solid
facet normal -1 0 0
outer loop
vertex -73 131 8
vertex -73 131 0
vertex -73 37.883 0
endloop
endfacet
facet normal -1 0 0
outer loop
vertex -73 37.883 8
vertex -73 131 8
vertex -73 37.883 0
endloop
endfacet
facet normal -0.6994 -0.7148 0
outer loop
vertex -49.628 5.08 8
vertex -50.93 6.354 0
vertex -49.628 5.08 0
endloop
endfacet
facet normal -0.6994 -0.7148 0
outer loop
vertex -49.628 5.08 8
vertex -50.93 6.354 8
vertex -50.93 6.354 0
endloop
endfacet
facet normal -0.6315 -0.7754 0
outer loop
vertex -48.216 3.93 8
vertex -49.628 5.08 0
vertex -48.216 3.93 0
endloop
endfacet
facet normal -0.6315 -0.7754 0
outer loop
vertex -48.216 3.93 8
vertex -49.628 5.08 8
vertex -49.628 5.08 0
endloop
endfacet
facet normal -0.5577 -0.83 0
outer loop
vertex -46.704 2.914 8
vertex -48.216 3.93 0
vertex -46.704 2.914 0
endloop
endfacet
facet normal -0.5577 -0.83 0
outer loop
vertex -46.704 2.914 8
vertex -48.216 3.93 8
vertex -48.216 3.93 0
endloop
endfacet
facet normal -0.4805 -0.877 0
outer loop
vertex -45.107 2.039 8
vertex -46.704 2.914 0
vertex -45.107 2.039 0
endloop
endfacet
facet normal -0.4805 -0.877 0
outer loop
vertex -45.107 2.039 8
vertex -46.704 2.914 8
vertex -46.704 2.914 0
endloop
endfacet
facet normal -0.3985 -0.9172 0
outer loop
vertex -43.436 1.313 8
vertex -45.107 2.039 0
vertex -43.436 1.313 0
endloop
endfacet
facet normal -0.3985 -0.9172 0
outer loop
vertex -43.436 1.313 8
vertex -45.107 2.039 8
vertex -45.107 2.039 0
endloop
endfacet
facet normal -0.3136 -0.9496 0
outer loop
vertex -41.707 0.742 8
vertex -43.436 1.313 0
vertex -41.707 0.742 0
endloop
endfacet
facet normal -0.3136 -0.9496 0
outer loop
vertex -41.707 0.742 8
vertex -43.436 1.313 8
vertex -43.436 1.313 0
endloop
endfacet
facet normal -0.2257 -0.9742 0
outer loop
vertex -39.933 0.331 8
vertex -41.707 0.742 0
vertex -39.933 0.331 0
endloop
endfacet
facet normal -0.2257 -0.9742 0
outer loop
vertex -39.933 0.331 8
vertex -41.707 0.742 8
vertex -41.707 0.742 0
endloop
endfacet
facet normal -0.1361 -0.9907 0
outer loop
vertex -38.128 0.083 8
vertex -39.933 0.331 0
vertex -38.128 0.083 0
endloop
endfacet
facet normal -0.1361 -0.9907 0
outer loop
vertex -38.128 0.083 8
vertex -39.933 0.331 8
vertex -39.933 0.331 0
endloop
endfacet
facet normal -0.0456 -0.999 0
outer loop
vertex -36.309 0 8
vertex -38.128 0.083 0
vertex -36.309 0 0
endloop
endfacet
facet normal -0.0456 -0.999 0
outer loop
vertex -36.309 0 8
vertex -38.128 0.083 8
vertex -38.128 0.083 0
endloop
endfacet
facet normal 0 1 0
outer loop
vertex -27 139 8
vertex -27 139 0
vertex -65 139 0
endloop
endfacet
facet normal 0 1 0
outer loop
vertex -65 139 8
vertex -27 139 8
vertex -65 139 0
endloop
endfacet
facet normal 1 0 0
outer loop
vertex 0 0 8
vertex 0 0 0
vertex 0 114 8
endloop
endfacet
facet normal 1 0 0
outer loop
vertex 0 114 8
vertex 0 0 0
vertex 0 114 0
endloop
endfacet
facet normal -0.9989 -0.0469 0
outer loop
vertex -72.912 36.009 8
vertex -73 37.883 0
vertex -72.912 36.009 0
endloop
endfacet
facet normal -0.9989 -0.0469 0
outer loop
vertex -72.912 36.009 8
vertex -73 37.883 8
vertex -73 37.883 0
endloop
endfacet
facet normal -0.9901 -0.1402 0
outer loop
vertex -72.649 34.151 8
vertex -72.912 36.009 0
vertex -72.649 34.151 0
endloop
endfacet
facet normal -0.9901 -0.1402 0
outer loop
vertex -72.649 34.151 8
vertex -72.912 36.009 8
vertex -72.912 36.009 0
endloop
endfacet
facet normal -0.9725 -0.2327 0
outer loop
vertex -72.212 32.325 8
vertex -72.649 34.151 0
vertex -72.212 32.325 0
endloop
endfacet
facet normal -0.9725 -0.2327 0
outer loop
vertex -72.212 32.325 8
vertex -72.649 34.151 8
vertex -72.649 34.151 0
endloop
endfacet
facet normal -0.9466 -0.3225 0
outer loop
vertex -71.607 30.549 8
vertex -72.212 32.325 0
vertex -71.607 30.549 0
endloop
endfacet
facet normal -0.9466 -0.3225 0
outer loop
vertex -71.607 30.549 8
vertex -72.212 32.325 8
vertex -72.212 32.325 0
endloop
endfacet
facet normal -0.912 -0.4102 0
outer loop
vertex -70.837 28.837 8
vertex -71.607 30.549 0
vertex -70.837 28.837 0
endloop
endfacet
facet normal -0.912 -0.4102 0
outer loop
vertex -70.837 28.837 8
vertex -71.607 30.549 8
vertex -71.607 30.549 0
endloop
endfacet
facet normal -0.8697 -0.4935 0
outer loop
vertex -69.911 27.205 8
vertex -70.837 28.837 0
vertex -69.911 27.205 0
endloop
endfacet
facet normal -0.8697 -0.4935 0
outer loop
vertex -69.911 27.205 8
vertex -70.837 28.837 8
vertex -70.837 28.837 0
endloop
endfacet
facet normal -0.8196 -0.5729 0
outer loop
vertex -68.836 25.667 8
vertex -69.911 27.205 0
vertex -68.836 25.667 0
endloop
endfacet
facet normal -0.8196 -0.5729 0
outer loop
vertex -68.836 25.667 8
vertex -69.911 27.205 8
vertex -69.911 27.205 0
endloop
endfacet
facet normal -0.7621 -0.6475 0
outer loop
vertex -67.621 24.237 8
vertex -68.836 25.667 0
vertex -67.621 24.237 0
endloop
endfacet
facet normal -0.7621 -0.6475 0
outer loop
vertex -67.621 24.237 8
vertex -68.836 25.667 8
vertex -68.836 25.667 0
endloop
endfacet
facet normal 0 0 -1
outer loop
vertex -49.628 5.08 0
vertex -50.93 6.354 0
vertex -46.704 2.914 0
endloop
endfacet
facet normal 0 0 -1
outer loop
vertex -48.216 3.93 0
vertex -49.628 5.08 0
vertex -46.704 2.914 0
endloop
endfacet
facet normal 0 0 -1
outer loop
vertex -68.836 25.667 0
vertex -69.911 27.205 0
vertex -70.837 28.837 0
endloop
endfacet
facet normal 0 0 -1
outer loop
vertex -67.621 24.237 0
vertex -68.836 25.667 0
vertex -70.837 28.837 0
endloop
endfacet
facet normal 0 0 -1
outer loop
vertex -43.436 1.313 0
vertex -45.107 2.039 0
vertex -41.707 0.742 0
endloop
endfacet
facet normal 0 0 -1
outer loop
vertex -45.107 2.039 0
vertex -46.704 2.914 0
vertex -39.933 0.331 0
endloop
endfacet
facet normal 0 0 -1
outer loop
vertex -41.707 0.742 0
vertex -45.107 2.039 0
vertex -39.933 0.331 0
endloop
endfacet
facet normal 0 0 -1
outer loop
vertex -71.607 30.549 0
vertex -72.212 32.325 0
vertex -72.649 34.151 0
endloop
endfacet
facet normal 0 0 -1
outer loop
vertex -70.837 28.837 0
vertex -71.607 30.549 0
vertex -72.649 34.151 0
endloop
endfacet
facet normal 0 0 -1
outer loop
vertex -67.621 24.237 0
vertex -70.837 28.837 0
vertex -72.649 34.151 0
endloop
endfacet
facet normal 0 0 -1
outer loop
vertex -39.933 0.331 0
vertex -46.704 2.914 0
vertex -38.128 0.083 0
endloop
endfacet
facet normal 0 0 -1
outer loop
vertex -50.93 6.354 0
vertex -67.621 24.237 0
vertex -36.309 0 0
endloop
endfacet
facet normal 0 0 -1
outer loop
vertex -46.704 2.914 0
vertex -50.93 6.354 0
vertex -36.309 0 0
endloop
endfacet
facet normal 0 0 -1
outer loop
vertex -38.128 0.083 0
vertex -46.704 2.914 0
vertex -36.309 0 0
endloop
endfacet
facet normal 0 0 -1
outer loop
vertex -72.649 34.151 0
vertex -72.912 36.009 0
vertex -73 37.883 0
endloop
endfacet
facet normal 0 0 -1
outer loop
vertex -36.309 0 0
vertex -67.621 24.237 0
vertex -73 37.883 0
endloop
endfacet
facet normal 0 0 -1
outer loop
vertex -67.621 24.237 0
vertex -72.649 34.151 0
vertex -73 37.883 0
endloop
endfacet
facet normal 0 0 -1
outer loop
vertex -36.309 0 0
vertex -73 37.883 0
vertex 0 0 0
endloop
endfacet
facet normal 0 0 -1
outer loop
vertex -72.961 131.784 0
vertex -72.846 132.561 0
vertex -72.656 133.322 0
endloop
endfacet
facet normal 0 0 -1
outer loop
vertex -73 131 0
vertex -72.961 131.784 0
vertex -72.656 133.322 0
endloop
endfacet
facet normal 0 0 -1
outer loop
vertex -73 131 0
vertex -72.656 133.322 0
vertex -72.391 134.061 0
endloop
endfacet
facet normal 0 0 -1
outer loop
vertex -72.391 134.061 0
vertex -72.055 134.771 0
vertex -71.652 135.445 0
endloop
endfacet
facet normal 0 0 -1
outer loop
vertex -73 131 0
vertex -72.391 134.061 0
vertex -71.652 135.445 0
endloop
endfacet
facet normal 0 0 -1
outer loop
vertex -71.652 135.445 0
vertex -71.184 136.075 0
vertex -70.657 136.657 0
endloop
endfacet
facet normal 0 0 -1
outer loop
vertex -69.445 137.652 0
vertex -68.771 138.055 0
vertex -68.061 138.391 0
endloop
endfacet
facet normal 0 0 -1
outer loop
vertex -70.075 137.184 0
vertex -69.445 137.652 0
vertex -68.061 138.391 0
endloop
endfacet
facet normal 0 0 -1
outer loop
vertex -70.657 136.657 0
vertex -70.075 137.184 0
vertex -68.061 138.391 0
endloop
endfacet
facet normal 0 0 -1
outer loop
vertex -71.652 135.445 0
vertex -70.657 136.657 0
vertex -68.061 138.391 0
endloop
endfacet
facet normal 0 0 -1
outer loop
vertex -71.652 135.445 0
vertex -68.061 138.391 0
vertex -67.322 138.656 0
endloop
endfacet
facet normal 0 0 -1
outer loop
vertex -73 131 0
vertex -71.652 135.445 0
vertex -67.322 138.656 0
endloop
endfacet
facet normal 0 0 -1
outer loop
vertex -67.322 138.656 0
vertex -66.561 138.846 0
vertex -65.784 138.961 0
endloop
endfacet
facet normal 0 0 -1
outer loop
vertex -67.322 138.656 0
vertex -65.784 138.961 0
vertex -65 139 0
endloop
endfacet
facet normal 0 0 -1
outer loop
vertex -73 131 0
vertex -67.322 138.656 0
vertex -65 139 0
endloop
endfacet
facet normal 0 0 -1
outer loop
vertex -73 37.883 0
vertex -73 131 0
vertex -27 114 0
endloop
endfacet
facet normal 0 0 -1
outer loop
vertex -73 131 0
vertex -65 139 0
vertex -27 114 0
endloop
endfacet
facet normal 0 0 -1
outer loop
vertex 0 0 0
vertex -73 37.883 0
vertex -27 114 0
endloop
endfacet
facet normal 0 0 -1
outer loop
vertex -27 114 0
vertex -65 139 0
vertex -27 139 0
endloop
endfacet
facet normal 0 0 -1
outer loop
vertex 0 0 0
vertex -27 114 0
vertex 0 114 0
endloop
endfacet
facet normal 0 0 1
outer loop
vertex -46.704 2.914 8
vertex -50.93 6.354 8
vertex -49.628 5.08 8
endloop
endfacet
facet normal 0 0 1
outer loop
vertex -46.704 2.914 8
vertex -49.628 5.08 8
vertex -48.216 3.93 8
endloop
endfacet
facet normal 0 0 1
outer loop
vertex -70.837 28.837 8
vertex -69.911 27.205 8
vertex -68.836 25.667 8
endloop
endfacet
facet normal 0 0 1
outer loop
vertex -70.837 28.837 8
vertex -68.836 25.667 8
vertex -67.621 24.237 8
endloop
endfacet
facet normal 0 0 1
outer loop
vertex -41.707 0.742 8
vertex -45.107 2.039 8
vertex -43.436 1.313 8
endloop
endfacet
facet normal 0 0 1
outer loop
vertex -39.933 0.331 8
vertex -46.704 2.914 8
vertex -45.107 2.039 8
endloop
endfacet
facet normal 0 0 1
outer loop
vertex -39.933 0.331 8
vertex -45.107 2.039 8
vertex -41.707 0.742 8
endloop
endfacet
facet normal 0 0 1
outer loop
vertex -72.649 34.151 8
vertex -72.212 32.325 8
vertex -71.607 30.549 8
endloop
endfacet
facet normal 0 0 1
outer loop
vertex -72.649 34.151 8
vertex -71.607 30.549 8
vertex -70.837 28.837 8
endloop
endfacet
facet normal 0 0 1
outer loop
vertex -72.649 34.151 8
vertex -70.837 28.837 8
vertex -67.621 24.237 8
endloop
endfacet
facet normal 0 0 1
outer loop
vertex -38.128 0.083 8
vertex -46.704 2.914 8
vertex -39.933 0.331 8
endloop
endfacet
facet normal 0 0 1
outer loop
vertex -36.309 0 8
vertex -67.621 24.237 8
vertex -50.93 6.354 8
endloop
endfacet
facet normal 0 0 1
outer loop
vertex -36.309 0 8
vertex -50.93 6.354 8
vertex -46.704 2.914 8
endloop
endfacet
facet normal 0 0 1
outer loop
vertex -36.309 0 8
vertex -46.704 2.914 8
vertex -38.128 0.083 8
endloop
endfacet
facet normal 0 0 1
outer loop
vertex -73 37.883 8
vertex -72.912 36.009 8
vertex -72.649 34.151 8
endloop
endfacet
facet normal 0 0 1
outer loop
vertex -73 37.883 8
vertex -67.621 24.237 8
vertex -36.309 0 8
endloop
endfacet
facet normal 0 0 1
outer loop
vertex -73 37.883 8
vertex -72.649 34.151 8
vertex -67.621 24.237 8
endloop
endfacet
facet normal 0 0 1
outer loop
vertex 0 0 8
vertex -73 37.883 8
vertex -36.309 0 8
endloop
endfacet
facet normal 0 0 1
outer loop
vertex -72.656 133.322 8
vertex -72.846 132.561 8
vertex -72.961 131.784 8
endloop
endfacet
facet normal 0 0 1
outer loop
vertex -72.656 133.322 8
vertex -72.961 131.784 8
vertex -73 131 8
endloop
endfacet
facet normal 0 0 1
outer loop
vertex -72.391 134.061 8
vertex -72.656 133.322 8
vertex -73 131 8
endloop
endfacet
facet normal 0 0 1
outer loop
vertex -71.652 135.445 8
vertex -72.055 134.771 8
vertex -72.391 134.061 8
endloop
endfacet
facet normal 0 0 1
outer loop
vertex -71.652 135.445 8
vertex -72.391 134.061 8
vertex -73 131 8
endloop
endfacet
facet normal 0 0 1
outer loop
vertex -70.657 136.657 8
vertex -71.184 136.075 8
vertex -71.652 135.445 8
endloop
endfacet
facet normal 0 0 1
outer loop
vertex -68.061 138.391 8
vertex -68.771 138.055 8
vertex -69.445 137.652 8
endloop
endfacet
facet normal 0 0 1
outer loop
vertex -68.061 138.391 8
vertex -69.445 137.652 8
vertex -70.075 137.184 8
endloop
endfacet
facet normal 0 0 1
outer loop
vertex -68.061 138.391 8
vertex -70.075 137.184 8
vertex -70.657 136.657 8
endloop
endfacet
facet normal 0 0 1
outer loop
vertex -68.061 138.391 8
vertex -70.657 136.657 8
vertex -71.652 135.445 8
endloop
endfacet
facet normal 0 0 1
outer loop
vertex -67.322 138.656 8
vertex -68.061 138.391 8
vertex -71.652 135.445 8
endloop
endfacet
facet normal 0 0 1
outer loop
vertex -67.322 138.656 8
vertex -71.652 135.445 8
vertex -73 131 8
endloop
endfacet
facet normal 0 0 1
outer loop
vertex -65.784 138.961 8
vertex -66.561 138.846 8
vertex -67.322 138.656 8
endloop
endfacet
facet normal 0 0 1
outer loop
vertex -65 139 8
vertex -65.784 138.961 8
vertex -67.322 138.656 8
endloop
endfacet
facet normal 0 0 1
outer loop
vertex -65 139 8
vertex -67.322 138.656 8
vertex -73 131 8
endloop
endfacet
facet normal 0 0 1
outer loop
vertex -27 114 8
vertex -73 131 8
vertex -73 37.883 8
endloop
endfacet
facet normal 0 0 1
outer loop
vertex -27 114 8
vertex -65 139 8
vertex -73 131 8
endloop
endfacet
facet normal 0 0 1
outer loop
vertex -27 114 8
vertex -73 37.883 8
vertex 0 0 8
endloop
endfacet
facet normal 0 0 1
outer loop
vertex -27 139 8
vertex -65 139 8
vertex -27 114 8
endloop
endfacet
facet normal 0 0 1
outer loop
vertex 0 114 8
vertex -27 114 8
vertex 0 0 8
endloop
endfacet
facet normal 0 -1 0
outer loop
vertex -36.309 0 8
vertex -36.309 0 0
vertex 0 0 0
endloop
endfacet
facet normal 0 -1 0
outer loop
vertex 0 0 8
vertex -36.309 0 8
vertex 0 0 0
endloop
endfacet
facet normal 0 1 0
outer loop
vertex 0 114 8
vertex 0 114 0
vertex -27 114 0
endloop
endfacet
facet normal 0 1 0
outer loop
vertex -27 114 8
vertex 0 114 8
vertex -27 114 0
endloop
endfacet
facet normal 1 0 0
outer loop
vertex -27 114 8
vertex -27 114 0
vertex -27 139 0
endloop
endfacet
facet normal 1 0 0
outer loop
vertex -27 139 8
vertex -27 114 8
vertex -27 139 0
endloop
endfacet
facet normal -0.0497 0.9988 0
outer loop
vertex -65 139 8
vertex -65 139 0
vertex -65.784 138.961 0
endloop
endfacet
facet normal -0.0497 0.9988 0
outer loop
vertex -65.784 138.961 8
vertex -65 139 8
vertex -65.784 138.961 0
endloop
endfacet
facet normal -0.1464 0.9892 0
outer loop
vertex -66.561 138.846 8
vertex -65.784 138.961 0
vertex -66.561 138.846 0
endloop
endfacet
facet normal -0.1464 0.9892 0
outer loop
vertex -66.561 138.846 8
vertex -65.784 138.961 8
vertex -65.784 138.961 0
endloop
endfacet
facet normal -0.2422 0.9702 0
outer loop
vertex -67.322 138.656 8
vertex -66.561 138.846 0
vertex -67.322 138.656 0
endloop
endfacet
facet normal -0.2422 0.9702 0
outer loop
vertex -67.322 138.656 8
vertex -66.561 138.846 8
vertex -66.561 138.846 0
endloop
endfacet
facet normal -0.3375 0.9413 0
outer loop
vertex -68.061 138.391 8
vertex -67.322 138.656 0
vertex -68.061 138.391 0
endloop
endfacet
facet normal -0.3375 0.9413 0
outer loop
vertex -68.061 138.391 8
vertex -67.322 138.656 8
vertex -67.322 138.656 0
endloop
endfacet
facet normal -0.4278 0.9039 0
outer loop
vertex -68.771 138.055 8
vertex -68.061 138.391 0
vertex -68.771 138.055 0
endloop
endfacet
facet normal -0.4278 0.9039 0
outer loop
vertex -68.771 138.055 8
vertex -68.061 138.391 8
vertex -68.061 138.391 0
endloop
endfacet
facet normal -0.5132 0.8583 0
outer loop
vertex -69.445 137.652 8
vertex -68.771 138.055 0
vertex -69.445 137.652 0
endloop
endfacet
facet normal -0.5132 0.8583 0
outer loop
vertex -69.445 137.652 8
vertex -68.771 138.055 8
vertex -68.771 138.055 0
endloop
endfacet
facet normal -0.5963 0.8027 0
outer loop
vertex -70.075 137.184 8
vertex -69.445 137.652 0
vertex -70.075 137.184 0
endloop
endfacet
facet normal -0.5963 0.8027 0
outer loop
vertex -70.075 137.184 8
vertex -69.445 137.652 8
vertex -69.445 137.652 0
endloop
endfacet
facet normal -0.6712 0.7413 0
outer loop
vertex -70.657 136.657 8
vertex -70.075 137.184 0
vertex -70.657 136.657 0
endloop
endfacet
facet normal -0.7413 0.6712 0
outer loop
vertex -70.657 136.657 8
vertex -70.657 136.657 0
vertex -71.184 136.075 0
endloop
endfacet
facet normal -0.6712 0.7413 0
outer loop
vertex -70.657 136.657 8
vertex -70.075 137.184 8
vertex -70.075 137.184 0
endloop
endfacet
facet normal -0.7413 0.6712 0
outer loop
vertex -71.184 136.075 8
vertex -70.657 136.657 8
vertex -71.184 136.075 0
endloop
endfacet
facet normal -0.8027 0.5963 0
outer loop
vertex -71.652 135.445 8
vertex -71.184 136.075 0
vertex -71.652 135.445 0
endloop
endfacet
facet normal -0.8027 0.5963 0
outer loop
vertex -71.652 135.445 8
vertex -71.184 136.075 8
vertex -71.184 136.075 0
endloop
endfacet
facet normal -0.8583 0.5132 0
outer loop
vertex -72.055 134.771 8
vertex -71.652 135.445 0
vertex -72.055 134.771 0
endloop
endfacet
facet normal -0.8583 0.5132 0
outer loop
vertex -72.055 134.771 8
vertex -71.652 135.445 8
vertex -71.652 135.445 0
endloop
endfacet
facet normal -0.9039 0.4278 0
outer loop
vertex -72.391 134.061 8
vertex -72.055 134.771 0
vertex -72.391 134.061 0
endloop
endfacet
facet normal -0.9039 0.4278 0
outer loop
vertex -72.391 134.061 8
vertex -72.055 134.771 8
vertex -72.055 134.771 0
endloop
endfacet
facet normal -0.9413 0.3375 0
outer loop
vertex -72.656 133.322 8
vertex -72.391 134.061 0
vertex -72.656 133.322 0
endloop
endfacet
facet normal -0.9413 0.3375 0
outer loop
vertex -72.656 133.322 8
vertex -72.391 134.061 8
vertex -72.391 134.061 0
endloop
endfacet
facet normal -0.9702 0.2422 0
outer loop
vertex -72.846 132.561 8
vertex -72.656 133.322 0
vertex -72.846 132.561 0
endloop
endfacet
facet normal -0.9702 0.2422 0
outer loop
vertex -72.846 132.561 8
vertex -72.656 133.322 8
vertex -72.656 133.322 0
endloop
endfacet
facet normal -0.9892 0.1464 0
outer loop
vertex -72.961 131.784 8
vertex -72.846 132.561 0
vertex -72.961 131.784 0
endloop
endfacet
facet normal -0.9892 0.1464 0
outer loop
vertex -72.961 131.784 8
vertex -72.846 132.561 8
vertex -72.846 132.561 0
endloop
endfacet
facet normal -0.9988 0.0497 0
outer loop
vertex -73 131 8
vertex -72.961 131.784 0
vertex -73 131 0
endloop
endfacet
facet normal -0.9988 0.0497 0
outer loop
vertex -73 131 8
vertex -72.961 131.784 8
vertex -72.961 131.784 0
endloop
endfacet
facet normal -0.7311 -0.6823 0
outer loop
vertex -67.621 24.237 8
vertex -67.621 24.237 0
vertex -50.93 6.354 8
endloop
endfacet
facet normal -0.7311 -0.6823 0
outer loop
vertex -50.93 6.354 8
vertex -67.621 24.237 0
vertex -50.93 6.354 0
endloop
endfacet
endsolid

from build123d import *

# Parameters (mm, degrees)
EXTRUDE_1_DEPTH = 8
FILLET_1_R      = 8
FILLET_2_R      = 20


with BuildPart() as part:
    # 草图1 → 凸台-拉伸1 (new body)
    with BuildSketch(Plane.XY):
        Polygon((0, 0), (0, 114), (-27, 114), (-27, 139), (-73, 139), (-73, 30), (-45, 0), align=None)
    extrude(amount=EXTRUDE_1_DEPTH)

    # 圆角1
    fillet_1_edges = [part.edges().sort_by_distance(p)[0] for p in [
        (-73, 139, 4),
    ]]
    fillet(fillet_1_edges, radius=FILLET_1_R)

    # 圆角2
    fillet_2_edges = [part.edges().sort_by_distance(p)[0] for p in [
        (-45, 0, 4),
        (-73, 30, 4),
    ]]
    fillet(fillet_2_edges, radius=FILLET_2_R)


solid = part.part
